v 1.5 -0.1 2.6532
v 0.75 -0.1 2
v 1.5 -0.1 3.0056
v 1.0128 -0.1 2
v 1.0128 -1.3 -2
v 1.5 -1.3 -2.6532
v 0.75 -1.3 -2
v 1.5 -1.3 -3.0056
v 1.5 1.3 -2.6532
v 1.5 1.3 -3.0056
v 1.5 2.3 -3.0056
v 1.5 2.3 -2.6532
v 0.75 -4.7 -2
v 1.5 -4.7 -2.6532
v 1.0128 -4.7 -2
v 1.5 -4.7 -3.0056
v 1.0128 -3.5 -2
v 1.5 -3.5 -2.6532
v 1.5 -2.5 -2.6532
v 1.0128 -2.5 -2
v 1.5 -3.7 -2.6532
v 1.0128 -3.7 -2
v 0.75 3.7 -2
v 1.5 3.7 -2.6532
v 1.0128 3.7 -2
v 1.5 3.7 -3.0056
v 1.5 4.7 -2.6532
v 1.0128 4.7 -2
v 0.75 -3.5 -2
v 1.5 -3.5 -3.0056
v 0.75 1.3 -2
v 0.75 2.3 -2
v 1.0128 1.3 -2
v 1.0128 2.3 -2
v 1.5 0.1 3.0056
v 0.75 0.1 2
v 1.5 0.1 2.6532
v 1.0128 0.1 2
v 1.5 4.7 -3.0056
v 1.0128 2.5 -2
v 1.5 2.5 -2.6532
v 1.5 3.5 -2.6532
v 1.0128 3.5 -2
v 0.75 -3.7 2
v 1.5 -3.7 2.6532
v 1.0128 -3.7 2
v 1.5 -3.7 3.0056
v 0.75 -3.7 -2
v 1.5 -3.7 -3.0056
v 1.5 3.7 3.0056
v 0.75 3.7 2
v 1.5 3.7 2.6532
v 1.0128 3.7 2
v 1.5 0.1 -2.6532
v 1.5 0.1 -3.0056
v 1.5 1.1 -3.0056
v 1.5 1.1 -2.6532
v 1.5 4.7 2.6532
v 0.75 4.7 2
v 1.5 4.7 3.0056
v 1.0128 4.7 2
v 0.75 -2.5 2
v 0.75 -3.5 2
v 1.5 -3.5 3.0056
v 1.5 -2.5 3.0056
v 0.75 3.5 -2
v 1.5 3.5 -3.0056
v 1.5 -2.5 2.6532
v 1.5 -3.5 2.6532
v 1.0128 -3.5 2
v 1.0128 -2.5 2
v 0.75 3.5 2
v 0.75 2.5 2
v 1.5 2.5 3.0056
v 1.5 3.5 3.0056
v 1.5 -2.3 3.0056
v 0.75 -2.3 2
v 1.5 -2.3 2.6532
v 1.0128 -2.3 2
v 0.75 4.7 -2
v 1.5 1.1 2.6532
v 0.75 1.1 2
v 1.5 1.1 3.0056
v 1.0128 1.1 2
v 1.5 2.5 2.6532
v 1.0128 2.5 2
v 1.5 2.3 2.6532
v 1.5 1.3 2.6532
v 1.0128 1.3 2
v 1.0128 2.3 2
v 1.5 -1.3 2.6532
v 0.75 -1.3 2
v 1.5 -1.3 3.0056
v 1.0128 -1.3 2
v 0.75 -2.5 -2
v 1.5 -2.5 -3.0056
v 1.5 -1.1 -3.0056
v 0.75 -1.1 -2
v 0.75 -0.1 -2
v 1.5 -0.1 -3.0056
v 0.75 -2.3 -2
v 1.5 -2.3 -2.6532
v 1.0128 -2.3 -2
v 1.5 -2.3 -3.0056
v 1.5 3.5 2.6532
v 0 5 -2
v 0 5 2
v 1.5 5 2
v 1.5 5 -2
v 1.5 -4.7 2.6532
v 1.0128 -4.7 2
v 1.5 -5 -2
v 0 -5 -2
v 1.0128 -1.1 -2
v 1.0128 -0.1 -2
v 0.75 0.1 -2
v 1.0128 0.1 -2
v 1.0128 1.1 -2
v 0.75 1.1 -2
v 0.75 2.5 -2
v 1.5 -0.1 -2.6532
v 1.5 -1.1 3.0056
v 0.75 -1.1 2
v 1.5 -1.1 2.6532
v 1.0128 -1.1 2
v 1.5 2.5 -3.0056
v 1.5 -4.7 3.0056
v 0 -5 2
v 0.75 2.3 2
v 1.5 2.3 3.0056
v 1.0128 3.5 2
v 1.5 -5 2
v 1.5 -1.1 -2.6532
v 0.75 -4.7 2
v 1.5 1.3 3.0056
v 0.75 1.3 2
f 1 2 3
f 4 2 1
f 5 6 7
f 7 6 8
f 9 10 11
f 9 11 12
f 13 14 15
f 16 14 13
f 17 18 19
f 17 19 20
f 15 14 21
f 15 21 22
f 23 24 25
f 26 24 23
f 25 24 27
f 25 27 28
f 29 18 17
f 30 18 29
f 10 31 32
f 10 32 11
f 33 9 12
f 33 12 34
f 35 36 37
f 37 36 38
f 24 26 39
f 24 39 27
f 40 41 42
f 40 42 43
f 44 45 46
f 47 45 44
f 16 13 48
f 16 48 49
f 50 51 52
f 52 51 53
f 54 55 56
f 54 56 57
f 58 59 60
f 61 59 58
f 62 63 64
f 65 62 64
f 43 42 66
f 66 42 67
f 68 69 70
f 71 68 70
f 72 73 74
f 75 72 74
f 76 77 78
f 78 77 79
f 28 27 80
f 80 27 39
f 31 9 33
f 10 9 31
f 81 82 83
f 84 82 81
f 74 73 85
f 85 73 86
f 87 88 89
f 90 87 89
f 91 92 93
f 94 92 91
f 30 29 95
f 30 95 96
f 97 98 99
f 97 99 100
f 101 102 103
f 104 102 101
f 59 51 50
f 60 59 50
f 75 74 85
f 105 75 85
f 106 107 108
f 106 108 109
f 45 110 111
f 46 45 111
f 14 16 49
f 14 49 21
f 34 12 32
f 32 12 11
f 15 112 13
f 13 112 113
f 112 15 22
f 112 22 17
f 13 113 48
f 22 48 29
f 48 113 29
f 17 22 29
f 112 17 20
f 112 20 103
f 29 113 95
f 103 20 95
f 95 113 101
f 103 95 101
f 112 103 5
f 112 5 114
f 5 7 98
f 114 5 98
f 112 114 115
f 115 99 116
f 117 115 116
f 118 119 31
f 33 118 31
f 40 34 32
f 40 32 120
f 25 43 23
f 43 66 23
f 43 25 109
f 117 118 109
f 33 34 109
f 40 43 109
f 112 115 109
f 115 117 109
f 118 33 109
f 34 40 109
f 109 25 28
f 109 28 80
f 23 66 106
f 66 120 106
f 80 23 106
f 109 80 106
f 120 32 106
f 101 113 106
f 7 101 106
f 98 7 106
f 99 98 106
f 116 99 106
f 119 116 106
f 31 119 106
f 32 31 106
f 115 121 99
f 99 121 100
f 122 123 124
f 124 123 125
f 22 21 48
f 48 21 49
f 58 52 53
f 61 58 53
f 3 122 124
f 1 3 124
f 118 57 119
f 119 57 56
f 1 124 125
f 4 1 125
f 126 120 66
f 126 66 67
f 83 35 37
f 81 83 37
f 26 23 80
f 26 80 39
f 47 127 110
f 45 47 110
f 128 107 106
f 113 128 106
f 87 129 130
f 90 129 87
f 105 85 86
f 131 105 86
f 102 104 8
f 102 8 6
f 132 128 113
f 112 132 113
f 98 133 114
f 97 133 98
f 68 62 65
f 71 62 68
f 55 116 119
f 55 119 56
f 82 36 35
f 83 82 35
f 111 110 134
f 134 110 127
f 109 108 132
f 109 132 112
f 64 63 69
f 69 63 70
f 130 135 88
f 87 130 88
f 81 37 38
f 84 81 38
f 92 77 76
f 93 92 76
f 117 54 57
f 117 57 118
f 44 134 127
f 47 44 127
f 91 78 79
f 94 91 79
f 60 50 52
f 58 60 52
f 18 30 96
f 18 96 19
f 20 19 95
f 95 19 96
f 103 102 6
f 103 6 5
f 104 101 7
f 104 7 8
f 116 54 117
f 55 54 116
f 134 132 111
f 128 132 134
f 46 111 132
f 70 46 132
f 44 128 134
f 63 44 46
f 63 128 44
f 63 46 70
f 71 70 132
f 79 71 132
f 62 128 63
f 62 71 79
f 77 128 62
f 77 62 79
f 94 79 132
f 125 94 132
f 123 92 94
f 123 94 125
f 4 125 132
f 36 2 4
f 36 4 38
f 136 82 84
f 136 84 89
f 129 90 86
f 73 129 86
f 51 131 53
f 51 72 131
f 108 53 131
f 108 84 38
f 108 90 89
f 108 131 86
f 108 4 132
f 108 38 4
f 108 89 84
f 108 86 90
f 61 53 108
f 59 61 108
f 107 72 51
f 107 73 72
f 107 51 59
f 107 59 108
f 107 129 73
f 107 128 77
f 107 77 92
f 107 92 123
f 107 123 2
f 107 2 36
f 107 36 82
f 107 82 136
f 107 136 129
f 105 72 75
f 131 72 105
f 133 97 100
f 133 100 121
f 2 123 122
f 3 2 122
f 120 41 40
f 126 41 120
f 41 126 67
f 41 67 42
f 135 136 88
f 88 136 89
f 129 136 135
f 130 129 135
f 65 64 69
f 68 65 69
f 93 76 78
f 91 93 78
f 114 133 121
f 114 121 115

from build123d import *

# Parameters (mm, degrees)
SKETCH_1_W             = 4
SKETCH_1_H             = 10
EXTRUDE_1_DEPTH        = 1.5
EXTRUDE_2_DEPTH        = 1
PATTERN_LINEAR_1_COUNT = 8
PATTERN_LINEAR_1_PITCH = 1.2
MIRROR_1_COPY_1_DEPTH  = 1
MIRROR_1_COPY_2_DEPTH  = 1
MIRROR_1_COPY_3_DEPTH  = 1
MIRROR_1_COPY_4_DEPTH  = 1
MIRROR_1_COPY_5_DEPTH  = 1
MIRROR_1_COPY_6_DEPTH  = 1
MIRROR_1_COPY_7_DEPTH  = 1


with BuildPart() as part:
    # 草图1 → 凸台-拉伸1 (new body)
    with BuildSketch(Plane(origin=(0, 0, 0), x_dir=(0, 0, -1), z_dir=(1, 0, 0))):
        Rectangle(SKETCH_1_W, SKETCH_1_H)
    extrude(amount=EXTRUDE_1_DEPTH)

    # 草图2 → 凸台-拉伸2 (add)
    with BuildSketch(Plane(origin=(0, -4.7, 0), x_dir=(-1, 0, 0), z_dir=(0, -1, 0))):
        Polygon((-0.75, 2), (-1.5, 3.005587043), (-1.5, 2.65324469), (-1.012788554, 2), align=None)
    extrude_2 = extrude(amount=-EXTRUDE_2_DEPTH)

    # 阵列(线性)1: 凸台-拉伸2 ×8
    with Locations(*[(0, i * PATTERN_LINEAR_1_PITCH, 0) for i in range(1, PATTERN_LINEAR_1_COUNT)]):
        add(extrude_2)

    # 镜向1: 凸台-拉伸2 across plane
    add(extrude_2.mirror(Plane.XY))

    # 镜向1 copy 1 sketch → 镜向1 copy 1 (add)
    with BuildSketch(Plane(origin=(0, -3.5, 0), x_dir=(-1, 0, 0), z_dir=(0, -1, 0))):
        Polygon((-0.75, -2), (-1.5, -3.005587043), (-1.5, -2.65324469), (-1.012788554, -2), align=None)
    extrude(amount=-MIRROR_1_COPY_1_DEPTH)

    # 镜向1 copy 2 sketch → 镜向1 copy 2 (add)
    with BuildSketch(Plane(origin=(0, -2.3, 0), x_dir=(-1, 0, 0), z_dir=(0, -1, 0))):
        Polygon((-0.75, -2), (-1.5, -3.005587043), (-1.5, -2.65324469), (-1.012788554, -2), align=None)
    extrude(amount=-MIRROR_1_COPY_2_DEPTH)

    # 镜向1 copy 3 sketch → 镜向1 copy 3 (add)
    with BuildSketch(Plane(origin=(0, -1.1, 0), x_dir=(-1, 0, 0), z_dir=(0, -1, 0))):
        Polygon((-0.75, -2), (-1.5, -3.005587043), (-1.5, -2.65324469), (-1.012788554, -2), align=None)
    extrude(amount=-MIRROR_1_COPY_3_DEPTH)

    # 镜向1 copy 4 sketch → 镜向1 copy 4 (add)
    with BuildSketch(Plane(origin=(0, 0.1, 0), x_dir=(-1, 0, 0), z_dir=(0, -1, 0))):
        Polygon((-0.75, -2), (-1.5, -3.005587043), (-1.5, -2.65324469), (-1.012788554, -2), align=None)
    extrude(amount=-MIRROR_1_COPY_4_DEPTH)

    # 镜向1 copy 5 sketch → 镜向1 copy 5 (add)
    with BuildSketch(Plane(origin=(0, 1.3, 0), x_dir=(-1, 0, 0), z_dir=(0, -1, 0))):
        Polygon((-0.75, -2), (-1.5, -3.005587043), (-1.5, -2.65324469), (-1.012788554, -2), align=None)
    extrude(amount=-MIRROR_1_COPY_5_DEPTH)

    # 镜向1 copy 6 sketch → 镜向1 copy 6 (add)
    with BuildSketch(Plane(origin=(0, 2.5, 0), x_dir=(-1, 0, 0), z_dir=(0, -1, 0))):
        Polygon((-0.75, -2), (-1.5, -3.005587043), (-1.5, -2.65324469), (-1.012788554, -2), align=None)
    extrude(amount=-MIRROR_1_COPY_6_DEPTH)

    # 镜向1 copy 7 sketch → 镜向1 copy 7 (add)
    with BuildSketch(Plane(origin=(0, 3.7, 0), x_dir=(-1, 0, 0), z_dir=(0, -1, 0))):
        Polygon((-0.75, -2), (-1.5, -3.005587043), (-1.5, -2.65324469), (-1.012788554, -2), align=None)
    extrude(amount=-MIRROR_1_COPY_7_DEPTH)


solid = part.part
